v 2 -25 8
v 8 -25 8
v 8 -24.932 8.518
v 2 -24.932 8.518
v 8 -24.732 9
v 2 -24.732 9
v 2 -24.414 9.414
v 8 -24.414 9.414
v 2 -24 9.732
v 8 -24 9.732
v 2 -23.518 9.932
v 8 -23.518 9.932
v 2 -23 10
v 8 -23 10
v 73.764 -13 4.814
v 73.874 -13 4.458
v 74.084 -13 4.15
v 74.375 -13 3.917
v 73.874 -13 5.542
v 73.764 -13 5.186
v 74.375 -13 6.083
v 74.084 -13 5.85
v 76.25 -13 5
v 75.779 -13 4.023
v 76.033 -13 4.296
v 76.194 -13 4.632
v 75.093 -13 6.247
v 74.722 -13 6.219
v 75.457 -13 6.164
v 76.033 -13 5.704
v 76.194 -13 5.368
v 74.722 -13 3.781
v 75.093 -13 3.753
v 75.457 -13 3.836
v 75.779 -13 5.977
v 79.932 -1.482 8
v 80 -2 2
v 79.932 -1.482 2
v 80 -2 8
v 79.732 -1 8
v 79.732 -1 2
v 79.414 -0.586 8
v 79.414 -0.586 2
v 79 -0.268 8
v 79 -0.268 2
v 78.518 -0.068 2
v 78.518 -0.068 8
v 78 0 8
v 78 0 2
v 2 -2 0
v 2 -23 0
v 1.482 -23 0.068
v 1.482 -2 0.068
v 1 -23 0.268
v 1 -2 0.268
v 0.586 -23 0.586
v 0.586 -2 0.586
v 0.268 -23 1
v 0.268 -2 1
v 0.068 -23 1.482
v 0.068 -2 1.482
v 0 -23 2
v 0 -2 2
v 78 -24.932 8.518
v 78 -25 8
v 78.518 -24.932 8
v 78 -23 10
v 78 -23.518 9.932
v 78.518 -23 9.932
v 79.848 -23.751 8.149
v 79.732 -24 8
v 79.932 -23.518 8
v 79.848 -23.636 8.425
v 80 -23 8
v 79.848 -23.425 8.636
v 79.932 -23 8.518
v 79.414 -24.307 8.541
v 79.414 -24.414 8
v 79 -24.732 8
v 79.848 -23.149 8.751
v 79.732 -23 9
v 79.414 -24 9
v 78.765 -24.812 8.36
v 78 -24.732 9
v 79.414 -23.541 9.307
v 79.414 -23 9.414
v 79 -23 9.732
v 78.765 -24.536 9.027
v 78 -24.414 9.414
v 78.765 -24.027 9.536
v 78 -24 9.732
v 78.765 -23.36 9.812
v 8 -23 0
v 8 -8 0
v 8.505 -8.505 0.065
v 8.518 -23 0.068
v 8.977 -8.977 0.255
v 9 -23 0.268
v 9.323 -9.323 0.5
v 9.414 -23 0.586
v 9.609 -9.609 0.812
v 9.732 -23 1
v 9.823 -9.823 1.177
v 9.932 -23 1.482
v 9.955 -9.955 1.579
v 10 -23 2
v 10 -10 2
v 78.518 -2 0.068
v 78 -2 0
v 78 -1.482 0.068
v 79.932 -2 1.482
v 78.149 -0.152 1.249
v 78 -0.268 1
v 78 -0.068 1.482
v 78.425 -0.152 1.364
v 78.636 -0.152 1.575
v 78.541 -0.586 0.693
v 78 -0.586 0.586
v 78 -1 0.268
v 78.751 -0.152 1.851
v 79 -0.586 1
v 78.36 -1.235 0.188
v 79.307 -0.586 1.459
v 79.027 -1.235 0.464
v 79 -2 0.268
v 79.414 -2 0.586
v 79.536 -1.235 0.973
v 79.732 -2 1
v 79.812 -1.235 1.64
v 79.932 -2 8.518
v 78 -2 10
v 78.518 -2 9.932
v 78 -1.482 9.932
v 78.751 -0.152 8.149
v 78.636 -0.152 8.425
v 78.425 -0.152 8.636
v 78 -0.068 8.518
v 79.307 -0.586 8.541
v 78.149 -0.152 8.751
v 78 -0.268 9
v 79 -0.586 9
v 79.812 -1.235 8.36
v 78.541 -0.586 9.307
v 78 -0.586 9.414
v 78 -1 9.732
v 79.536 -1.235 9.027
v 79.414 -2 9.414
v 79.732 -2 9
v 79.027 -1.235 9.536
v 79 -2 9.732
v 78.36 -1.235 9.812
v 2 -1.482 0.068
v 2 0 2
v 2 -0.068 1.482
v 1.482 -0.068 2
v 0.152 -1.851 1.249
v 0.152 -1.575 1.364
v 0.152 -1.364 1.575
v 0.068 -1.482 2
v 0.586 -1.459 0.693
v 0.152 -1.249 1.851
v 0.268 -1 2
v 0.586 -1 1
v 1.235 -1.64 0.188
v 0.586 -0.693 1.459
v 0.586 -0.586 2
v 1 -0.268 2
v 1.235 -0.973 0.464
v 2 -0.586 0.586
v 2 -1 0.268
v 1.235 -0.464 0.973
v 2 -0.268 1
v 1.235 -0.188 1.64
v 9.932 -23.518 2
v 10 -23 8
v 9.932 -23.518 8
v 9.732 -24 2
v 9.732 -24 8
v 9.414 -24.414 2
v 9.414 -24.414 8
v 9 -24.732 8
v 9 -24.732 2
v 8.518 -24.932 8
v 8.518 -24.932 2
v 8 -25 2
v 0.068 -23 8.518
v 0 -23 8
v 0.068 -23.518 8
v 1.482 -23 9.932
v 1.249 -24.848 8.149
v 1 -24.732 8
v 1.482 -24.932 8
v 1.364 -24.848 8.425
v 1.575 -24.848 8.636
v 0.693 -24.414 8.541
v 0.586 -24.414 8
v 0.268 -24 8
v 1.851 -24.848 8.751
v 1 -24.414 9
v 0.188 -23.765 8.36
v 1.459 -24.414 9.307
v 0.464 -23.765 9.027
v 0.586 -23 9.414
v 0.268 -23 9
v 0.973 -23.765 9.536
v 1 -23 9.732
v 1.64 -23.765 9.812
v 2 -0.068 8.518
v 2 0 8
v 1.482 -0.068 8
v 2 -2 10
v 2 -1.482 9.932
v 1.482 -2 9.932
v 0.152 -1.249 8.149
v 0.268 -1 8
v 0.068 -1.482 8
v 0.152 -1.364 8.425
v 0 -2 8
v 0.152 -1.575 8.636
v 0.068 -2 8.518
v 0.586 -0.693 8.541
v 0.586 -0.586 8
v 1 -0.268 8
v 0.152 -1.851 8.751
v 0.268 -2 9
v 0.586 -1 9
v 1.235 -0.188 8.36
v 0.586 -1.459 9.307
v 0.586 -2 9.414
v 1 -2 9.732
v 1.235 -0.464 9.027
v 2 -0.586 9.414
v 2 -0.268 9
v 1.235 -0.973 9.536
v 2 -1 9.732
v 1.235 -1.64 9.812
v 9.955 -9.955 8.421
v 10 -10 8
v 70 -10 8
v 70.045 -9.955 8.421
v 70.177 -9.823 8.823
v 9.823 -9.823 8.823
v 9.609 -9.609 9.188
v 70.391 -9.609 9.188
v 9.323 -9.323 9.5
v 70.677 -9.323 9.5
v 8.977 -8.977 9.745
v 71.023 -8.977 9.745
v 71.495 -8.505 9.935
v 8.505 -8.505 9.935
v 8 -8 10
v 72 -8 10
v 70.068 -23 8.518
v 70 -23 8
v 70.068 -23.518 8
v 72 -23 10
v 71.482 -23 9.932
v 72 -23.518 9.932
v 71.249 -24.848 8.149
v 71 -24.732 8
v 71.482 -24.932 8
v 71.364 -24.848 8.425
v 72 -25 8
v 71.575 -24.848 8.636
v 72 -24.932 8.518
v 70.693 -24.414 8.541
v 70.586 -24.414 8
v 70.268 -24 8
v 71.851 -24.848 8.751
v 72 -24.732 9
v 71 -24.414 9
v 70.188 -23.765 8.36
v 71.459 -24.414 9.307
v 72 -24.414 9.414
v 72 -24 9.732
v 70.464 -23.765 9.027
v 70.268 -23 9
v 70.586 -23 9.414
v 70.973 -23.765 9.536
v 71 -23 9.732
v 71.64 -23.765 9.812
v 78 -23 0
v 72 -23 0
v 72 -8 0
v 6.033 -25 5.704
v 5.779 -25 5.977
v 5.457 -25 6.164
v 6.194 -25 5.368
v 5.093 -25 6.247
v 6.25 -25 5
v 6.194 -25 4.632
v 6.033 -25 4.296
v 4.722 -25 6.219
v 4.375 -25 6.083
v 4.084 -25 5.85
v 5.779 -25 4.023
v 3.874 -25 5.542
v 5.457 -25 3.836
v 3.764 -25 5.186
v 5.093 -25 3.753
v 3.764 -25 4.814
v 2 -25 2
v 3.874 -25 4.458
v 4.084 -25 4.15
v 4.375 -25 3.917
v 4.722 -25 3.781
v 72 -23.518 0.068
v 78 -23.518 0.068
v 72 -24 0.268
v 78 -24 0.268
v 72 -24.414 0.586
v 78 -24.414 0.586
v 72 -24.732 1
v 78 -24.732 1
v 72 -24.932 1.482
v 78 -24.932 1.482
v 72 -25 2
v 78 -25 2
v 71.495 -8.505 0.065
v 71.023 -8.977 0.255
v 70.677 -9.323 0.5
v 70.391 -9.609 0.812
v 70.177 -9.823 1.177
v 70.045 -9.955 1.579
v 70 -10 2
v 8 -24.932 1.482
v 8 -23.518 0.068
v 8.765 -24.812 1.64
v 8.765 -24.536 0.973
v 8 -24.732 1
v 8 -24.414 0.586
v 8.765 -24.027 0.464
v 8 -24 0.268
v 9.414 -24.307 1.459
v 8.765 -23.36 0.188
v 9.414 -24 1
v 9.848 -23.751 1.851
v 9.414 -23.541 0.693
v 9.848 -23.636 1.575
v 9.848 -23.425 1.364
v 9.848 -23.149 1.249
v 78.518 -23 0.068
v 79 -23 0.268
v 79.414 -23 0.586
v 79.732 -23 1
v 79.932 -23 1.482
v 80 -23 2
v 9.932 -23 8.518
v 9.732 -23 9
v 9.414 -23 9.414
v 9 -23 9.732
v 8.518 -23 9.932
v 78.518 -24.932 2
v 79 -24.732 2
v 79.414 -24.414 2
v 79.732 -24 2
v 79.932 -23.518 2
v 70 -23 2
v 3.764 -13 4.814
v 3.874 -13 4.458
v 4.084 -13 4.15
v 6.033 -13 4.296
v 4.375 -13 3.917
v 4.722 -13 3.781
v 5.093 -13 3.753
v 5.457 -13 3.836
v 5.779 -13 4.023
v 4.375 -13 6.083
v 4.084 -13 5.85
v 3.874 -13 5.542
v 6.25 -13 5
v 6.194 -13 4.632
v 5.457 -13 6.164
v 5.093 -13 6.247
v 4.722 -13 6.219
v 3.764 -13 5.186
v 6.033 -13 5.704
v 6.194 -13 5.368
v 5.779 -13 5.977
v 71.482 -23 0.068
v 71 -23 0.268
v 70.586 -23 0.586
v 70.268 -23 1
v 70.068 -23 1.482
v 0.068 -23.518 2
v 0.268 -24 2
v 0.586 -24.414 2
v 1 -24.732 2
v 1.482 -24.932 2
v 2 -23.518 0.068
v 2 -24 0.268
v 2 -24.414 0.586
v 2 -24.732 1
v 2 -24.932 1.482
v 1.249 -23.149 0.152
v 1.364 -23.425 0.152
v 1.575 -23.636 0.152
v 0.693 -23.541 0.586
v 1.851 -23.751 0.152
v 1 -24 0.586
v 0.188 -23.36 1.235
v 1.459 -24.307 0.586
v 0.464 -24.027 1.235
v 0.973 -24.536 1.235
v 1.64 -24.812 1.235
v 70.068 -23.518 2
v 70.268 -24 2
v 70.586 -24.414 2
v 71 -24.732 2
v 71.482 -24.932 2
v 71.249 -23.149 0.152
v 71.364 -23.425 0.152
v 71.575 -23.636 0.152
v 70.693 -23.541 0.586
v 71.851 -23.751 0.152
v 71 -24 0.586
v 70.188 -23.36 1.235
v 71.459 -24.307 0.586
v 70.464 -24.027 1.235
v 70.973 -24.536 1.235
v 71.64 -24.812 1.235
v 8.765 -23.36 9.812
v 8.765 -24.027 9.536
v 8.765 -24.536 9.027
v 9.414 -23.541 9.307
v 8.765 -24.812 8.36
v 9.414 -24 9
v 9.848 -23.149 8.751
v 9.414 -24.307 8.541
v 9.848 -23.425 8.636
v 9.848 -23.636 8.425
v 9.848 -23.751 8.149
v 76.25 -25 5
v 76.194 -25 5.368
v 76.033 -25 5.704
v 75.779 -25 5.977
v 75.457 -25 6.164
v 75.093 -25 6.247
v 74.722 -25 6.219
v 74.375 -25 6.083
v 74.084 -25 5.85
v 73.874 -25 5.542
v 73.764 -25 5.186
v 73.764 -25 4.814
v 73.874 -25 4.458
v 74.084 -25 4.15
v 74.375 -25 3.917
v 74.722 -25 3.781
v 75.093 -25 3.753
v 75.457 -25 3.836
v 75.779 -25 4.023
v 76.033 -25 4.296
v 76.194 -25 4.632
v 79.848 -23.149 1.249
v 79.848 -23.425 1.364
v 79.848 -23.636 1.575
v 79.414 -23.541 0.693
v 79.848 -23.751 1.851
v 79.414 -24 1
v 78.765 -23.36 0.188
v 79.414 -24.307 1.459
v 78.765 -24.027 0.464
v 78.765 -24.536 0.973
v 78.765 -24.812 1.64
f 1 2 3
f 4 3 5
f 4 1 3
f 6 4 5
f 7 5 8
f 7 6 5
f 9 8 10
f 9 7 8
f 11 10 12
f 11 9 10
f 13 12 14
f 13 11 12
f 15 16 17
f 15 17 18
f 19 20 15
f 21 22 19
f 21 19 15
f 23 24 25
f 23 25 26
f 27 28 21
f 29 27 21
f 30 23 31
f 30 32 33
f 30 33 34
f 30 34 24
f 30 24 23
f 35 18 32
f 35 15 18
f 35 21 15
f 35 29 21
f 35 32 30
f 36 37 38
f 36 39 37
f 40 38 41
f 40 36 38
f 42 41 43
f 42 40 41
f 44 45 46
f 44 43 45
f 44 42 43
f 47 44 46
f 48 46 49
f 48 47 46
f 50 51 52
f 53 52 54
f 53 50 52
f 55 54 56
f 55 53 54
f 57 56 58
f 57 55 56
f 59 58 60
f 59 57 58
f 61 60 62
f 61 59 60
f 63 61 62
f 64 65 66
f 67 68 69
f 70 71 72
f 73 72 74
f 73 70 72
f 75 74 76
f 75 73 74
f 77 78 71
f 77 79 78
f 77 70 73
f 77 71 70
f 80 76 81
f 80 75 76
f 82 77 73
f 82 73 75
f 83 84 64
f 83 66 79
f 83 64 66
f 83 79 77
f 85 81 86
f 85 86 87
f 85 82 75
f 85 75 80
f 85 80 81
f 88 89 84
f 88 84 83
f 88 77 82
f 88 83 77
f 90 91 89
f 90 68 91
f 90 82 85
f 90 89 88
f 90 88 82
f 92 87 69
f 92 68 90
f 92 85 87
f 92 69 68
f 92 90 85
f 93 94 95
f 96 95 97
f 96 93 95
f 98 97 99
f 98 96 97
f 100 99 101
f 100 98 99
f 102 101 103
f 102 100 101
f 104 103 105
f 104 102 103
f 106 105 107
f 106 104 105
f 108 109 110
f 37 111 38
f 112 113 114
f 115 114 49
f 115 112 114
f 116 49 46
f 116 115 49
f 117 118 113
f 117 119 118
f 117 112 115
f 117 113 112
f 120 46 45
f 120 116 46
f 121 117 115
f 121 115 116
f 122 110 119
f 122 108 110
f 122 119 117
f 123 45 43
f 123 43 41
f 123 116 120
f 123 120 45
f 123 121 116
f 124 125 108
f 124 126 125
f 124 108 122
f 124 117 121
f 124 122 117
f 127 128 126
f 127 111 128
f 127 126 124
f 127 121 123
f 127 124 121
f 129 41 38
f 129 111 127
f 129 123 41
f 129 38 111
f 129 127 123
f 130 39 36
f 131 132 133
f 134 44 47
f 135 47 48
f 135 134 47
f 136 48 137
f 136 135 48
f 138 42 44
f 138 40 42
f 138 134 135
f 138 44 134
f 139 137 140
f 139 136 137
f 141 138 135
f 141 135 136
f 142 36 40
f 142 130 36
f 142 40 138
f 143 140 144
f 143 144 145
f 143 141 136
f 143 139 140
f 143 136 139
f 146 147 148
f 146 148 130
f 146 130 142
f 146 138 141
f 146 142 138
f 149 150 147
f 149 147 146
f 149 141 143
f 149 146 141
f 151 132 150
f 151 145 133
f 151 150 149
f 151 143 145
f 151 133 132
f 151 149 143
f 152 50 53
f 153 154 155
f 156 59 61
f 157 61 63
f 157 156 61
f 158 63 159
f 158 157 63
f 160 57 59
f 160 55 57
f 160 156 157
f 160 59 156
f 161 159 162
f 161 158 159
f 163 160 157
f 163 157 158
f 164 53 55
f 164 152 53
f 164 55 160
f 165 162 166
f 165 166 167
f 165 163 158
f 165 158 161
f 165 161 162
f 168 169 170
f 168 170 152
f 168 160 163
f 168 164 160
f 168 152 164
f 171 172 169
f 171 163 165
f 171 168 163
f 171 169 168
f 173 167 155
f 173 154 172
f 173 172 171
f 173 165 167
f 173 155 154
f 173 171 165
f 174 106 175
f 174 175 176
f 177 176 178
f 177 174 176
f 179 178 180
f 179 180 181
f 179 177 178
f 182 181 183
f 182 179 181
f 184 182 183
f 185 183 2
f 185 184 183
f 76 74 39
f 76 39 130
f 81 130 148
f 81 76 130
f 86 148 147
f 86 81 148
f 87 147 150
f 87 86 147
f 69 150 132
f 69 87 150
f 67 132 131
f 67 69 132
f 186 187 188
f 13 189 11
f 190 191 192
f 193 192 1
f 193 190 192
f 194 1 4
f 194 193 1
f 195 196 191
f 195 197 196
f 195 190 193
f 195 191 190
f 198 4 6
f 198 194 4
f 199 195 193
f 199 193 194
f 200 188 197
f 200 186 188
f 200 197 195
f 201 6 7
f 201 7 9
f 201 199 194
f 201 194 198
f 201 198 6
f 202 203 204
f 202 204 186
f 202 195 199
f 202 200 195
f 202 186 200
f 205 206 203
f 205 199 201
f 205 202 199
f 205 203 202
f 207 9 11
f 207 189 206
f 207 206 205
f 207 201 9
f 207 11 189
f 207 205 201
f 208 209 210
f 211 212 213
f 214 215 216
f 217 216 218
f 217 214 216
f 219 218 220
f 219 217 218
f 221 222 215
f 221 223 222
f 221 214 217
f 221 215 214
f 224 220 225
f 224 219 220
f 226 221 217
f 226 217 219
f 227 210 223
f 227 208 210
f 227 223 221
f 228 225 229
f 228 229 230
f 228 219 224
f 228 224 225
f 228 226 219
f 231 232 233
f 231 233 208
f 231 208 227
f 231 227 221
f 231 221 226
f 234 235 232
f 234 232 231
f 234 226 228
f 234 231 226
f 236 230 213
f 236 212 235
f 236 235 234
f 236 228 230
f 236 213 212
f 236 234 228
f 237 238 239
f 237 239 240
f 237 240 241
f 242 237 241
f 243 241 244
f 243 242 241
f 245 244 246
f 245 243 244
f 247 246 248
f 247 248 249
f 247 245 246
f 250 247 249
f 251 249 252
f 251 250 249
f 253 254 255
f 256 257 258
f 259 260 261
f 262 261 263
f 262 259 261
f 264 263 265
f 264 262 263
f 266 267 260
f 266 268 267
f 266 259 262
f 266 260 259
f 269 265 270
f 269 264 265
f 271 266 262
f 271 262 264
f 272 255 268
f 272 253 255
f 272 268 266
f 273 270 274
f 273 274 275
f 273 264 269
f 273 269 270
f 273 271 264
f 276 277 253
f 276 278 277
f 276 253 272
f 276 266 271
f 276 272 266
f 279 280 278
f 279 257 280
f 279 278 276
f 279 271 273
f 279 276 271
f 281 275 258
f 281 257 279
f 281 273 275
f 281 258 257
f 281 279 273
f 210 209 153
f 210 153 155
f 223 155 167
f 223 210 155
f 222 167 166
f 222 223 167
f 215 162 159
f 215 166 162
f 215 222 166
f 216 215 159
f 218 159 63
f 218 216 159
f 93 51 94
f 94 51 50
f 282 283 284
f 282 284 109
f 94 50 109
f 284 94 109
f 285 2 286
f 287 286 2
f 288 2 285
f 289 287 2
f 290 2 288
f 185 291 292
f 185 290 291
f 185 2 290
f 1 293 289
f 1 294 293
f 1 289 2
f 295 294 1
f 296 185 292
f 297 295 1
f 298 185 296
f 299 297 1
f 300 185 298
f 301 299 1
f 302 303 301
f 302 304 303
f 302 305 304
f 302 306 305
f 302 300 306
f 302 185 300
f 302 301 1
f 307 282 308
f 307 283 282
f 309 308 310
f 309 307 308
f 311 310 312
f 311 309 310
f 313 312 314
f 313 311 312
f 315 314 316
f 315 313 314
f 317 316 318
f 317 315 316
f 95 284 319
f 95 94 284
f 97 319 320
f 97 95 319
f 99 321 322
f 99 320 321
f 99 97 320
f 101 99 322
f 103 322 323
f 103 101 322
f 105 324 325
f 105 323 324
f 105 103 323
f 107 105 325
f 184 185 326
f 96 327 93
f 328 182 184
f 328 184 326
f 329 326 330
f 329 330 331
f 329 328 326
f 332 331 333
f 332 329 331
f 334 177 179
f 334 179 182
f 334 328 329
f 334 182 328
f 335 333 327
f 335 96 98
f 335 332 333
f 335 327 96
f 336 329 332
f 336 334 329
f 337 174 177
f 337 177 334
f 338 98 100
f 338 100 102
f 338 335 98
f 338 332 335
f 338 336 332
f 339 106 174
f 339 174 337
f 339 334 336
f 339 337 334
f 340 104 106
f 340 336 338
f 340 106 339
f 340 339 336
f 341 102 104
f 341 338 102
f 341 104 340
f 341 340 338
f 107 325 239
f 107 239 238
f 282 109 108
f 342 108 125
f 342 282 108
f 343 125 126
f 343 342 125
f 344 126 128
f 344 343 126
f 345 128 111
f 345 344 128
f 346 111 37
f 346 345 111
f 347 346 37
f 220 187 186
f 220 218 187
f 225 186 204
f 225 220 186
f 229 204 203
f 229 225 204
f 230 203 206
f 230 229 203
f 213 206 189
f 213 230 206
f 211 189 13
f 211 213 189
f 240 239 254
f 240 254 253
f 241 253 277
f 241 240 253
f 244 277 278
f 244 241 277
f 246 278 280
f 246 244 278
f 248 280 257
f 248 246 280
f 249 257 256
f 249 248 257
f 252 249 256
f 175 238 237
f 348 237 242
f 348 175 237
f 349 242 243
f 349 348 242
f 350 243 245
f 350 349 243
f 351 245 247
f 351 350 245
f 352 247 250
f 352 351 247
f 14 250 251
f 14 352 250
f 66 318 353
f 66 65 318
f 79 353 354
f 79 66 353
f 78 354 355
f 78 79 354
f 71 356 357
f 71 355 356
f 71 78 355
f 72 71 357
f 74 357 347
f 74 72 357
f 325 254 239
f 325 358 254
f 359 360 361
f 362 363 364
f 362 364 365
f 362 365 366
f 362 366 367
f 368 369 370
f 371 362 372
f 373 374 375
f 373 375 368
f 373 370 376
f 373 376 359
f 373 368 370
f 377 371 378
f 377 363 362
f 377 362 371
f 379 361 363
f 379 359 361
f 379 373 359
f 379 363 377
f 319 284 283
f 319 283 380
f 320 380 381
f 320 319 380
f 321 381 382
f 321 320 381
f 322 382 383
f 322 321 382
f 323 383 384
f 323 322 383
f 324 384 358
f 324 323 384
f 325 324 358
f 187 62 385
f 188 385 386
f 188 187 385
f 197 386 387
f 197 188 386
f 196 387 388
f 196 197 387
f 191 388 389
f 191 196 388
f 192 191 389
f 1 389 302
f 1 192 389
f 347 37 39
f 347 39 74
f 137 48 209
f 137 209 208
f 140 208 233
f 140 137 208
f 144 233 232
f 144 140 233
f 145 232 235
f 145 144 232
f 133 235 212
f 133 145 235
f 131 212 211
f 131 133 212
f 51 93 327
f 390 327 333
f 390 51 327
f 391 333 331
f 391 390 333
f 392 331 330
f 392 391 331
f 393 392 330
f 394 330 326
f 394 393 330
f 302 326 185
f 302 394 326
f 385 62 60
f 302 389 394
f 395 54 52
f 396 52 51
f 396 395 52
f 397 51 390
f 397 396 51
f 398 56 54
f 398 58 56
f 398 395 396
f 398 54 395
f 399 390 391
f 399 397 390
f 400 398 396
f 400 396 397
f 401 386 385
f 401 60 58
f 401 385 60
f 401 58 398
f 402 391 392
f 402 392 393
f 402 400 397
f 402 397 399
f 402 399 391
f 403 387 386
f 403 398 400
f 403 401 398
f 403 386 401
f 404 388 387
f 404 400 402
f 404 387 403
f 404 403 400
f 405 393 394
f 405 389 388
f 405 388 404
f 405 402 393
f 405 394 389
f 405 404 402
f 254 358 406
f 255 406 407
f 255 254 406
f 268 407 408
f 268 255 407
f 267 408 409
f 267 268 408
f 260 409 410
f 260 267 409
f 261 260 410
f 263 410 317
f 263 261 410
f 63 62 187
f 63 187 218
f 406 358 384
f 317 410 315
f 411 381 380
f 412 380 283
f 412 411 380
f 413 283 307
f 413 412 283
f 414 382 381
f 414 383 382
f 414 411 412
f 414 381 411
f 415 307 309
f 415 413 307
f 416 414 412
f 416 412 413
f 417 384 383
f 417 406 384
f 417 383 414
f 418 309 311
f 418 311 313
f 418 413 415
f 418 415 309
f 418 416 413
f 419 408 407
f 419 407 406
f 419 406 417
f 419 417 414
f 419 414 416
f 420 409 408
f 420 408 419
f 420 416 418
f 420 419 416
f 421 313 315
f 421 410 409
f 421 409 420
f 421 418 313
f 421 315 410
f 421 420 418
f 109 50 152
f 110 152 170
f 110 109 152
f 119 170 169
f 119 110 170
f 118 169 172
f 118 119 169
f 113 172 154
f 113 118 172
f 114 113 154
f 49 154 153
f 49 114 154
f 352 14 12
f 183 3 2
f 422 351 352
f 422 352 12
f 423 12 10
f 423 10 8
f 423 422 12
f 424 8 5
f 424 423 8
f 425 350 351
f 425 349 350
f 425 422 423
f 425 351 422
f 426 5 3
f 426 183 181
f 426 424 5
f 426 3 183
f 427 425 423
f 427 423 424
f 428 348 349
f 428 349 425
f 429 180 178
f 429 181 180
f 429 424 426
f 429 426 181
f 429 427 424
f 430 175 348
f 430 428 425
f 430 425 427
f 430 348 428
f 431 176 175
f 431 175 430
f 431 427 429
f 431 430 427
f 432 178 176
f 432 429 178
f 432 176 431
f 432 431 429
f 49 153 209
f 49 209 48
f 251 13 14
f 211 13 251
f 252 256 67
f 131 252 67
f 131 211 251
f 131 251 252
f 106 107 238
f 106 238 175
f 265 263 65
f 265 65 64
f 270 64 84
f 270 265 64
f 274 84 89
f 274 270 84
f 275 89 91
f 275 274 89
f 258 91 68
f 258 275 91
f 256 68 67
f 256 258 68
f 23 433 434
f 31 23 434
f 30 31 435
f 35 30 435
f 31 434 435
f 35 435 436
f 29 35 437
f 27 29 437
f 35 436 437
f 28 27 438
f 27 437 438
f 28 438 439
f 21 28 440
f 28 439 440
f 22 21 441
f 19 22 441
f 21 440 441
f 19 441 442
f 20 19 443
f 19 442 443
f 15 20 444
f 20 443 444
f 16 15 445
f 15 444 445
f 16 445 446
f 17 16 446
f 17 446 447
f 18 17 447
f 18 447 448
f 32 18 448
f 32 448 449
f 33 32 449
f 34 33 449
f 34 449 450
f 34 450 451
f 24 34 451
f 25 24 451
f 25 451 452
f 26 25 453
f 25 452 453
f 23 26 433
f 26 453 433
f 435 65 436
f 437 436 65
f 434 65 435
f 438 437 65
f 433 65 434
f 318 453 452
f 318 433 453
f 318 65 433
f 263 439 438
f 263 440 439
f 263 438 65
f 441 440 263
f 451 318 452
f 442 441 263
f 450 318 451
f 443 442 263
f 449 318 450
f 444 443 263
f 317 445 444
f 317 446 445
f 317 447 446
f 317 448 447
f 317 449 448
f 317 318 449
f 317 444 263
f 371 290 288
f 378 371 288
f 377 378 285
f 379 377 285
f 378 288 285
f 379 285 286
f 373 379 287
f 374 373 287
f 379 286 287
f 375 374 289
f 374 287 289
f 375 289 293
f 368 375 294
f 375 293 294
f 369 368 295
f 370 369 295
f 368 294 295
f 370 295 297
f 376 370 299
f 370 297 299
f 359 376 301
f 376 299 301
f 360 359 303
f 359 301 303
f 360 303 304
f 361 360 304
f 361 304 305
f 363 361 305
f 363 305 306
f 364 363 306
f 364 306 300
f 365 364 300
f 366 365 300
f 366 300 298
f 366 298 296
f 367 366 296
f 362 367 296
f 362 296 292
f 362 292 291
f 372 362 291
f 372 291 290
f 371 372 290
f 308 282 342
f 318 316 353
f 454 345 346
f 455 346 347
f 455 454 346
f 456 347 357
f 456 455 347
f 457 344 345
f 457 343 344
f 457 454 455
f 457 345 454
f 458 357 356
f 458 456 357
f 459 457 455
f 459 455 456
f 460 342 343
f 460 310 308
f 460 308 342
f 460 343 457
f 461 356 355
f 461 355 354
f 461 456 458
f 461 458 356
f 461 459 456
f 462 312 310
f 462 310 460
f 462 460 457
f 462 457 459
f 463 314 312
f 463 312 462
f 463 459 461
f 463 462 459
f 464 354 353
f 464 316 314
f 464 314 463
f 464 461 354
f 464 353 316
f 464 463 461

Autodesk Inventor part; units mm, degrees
ref_plane "YZ Plane" through (0, 0, 0) normal (1, 0, 0) x (0, 1, 0)
ref_plane "XZ Plane" through (0, 0, 0) normal (0, 1, 0) x (-1, 0, 0)
ref_plane "XY Plane" through (0, 0, 0) normal (0, 0, 1) x (1, 0, 0)
sketch "Boceto1" plane through (0, 0, 0) normal (0, 0, 1) x (1, 0, 0)
  line L0 (0, 0) -> (80, 0)
  line L1 (80, 0) -> (80, -25)
  line L2 (80, -25) -> (70, -25)
  line L3 (70, -25) -> (70, -10)
  line L4 (70, -10) -> (10, -10)
  line L5 (10, -10) -> (10, -25)
  line L6 (10, -25) -> (0, -25)
  line L7 (0, -25) -> (0, 0)
  dimension "d0" = 10
  dimension "d1" = 80
  dimension "d2" = 10
  dimension "d3" = 15
  dimension "d4" = 25
  dimension "d6" = 25
extrude "Extrusión1" add sketch "Boceto1" along normal blind 10
fillet "Empalme1" radius 2 21 edges at (10, -17.5, 10) (40, -10, 10) (70, -17.5, 10) (10, -17.5, 0) (40, -10, 0) (70, -25, 5) (75, -25, 10) (75, -25, 0) (80, -25, 5) (80, -12.5, 10) (80, -12.5, 0) (40, 0, 10) (0, -12.5, 10) (5, -25, 10) (0, -25, 5) (5, -25, 0) (40, 0, 0) (80, 0, 5) (0, 0, 5) (0, -12.5, 0) (70, -17.5, 0)
sketch "Boceto2" plane through (72, -25, 8) normal (0, -1, 0) x (1, 0, 0)
  circle A0 centre (3, -3) radius 1.25
  point P0 (-72, -8)
  dimension "d10" = 2.5
extrude "Extrusión2" cut sketch "Boceto2" against normal blind 12
fillet "Empalme2" radius 2 3 edges at (9.4142, -24.4142, 9.4142) (9.4142, -24.4142, 0.5858) (10, -25, 5)
sketch "Boceto4" plane through (2, -25, 2) normal (0, -1, 0) x (1, 0, 0)
  circle A0 centre (3, 3) radius 1.25
  point P0 (-2, -2)
  dimension "d18" = 2.5
extrude "Extrusión4" cut sketch "Boceto4" against normal blind 12
properties part number "maneta porta"
